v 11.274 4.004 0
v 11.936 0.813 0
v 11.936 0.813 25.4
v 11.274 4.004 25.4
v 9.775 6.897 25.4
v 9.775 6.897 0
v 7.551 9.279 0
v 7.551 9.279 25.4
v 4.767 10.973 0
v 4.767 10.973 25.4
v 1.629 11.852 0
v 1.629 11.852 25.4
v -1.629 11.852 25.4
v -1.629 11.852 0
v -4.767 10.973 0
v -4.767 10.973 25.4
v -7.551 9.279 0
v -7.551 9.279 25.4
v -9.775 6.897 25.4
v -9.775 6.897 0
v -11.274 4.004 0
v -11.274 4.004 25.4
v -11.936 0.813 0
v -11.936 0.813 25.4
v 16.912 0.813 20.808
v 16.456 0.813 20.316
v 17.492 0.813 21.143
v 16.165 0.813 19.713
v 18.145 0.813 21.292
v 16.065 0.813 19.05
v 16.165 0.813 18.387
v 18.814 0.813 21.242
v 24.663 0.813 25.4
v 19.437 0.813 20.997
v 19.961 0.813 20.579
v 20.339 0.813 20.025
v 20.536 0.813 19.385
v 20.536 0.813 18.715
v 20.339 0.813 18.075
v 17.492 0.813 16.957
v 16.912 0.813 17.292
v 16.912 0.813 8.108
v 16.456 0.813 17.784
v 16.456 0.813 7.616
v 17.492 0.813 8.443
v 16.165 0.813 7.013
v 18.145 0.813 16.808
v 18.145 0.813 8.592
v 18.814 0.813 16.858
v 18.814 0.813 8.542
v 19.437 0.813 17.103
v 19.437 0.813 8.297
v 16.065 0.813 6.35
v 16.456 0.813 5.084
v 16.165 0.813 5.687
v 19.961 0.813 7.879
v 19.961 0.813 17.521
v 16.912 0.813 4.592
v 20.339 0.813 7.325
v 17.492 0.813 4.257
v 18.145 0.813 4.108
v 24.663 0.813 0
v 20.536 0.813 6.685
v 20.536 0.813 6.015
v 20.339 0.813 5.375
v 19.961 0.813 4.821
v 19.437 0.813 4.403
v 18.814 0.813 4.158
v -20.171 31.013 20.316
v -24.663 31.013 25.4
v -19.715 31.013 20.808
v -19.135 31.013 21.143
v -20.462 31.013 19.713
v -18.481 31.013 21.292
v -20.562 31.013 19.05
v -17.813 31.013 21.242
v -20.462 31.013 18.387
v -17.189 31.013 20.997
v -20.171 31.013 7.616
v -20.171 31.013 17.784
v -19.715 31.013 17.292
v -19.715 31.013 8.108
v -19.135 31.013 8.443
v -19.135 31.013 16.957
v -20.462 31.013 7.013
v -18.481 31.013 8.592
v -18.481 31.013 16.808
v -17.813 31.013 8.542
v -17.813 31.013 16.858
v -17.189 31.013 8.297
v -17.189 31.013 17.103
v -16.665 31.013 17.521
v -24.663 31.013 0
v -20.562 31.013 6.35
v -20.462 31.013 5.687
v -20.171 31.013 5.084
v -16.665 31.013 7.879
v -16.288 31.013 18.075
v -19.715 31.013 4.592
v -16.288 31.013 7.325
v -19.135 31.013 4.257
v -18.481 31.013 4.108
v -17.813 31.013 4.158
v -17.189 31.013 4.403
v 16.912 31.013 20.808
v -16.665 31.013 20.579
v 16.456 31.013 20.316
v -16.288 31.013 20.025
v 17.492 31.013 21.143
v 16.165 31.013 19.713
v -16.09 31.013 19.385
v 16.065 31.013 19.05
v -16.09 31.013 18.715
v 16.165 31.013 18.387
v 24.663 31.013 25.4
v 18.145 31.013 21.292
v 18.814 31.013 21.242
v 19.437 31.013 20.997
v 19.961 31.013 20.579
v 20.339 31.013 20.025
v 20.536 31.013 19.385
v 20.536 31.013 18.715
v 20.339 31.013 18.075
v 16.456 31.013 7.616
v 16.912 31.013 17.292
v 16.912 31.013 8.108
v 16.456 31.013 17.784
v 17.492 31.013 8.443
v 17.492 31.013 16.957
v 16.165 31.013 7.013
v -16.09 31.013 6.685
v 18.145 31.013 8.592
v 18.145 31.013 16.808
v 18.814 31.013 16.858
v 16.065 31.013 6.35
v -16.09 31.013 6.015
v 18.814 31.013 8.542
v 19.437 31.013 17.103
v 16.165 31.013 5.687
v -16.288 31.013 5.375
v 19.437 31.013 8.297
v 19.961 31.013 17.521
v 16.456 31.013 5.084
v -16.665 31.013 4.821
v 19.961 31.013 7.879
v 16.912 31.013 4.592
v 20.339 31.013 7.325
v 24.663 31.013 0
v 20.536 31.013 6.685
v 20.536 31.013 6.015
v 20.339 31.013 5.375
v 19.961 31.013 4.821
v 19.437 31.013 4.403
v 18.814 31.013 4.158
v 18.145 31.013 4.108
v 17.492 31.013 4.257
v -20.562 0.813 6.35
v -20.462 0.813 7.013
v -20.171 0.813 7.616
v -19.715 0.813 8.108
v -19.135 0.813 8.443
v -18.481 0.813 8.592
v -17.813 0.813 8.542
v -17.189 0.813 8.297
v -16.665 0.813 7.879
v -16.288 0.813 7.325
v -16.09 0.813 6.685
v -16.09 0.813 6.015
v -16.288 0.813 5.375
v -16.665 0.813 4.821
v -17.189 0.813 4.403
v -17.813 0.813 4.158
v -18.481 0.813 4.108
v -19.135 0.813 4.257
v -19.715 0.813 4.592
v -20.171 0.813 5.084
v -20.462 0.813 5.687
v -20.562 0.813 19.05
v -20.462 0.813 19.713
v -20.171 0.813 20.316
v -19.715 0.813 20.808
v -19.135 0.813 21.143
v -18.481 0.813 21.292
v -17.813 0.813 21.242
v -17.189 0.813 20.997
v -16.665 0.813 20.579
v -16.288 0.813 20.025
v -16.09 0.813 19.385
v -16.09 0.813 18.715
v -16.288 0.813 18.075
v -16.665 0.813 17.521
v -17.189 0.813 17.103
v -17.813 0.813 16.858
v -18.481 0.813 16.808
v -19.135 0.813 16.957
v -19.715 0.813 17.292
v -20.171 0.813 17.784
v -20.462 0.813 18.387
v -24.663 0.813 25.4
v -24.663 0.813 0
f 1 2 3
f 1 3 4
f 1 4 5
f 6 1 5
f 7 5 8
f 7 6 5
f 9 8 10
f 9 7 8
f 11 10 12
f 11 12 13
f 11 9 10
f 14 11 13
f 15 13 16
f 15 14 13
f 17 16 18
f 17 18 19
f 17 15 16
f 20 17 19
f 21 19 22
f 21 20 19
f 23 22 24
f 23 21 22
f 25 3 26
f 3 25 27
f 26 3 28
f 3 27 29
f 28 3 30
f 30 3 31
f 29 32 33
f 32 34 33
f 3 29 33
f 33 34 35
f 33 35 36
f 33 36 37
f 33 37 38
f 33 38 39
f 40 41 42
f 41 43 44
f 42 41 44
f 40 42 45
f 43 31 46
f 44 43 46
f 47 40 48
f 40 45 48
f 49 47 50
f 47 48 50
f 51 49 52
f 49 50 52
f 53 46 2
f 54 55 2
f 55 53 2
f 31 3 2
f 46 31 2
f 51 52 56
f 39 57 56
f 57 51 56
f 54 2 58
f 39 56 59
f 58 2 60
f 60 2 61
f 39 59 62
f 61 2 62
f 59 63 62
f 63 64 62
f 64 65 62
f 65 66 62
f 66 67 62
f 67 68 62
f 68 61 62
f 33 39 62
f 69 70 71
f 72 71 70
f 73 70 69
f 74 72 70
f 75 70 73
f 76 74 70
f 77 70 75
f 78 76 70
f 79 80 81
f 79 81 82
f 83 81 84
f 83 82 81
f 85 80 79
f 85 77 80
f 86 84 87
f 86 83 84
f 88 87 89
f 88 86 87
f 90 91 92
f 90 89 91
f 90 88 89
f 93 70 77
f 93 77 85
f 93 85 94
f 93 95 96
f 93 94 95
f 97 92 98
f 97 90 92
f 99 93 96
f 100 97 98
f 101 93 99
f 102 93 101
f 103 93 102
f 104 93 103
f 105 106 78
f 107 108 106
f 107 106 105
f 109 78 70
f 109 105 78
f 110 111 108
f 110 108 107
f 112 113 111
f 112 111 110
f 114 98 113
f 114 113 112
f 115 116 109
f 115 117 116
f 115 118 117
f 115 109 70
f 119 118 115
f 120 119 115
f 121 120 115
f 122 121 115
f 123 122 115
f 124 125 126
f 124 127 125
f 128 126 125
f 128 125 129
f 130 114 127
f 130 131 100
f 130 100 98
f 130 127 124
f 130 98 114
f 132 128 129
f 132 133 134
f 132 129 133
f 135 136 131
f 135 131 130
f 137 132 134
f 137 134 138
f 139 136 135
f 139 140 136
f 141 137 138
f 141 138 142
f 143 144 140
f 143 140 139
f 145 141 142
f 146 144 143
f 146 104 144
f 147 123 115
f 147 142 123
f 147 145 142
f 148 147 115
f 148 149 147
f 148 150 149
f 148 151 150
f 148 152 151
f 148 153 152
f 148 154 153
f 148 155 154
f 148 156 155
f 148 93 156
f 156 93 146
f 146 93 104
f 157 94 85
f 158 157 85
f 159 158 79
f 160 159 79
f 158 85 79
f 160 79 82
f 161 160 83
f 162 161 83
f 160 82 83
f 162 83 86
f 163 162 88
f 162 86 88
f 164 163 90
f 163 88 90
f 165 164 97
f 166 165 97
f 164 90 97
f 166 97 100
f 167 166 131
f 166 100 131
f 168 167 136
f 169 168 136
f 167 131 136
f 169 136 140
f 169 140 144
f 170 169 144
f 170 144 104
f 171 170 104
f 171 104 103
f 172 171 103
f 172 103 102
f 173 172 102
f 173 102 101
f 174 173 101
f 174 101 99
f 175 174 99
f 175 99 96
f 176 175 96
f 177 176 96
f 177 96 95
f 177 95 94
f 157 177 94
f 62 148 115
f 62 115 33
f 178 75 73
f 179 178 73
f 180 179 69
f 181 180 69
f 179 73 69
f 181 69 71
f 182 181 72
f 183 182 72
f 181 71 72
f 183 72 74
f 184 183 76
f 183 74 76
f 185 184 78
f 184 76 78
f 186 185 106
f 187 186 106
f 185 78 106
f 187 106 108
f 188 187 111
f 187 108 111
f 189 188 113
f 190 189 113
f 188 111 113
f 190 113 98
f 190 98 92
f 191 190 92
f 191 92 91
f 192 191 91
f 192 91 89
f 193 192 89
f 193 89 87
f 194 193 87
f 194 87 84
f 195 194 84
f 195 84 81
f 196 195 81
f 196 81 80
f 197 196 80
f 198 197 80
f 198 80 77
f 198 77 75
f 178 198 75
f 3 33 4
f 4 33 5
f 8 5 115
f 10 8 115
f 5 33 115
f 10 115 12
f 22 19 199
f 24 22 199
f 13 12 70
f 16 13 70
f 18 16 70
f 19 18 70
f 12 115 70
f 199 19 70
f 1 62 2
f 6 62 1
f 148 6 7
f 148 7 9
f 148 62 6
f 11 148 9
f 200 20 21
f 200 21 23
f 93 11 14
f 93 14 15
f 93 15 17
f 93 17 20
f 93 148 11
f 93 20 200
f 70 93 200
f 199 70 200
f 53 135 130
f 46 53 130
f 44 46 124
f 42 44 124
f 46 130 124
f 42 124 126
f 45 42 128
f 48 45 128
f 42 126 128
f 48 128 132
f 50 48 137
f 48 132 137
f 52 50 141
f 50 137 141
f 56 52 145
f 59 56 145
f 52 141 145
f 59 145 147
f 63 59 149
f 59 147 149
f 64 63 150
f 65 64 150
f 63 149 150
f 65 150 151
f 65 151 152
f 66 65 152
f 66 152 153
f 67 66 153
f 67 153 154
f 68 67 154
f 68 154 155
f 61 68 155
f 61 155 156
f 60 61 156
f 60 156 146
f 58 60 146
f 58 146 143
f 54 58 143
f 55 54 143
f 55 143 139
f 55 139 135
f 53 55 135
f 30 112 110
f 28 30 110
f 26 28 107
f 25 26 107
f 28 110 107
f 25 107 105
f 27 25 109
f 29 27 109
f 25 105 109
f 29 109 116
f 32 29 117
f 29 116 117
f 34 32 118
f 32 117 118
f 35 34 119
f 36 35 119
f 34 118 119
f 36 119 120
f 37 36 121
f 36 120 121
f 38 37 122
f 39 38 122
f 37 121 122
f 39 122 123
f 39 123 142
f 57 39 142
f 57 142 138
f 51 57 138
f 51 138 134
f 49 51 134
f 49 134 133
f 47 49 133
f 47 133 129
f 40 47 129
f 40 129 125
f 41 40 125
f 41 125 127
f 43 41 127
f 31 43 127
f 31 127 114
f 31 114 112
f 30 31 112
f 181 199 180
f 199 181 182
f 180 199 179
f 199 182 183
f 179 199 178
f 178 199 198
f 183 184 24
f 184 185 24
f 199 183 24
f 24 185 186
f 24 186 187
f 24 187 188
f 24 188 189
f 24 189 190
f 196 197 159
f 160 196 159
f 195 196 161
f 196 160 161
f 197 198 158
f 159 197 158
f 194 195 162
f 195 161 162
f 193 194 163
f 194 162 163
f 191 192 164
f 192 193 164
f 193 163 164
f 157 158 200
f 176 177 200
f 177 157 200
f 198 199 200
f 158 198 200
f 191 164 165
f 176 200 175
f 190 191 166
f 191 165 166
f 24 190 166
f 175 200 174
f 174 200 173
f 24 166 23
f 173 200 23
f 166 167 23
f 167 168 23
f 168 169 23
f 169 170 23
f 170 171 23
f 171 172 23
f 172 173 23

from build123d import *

# Parameters (mm, degrees)
PAD_DEPTH    = 25.4
SKETCH001_R  = 2.248154
POCKET_DEPTH = 30.2016


with BuildPart() as part:
    # Sketch → Pad (new body)
    with BuildSketch(Plane.XY):
        with BuildLine():
            ThreePointArc((11.935765, 0.8128), (0, 11.963408), (-11.935765, 0.8128))
            Line((-24.6634, 0.8128), (-11.935765, 0.8128))
            Line((-24.6634, 31.0134), (-24.6634, 0.8128))
            Line((-24.6634, 31.0134), (24.6634, 31.0134))
            Line((24.6634, 31.0134), (24.6634, 0.8128))
            Line((11.935765, 0.8128), (24.6634, 0.8128))
        make_face()
    extrude(amount=PAD_DEPTH)

    # Sketch001 (on Face4 of Pad) → Pocket (cut, through all)
    with BuildSketch(Plane(origin=(0, 31.0134, 0), x_dir=(-1, 0, 0), z_dir=(0, 1, 0))):
        with Locations((18.3134, 6.35)):
            Circle(SKETCH001_R)
        with Locations((18.3134, 19.05)):
            Circle(SKETCH001_R)
        with Locations((-18.3134, 19.05)):
            Circle(SKETCH001_R)
        with Locations((-18.3134, 6.35)):
            Circle(SKETCH001_R)
    extrude(amount=-POCKET_DEPTH, mode=Mode.SUBTRACT)


solid = part.part
